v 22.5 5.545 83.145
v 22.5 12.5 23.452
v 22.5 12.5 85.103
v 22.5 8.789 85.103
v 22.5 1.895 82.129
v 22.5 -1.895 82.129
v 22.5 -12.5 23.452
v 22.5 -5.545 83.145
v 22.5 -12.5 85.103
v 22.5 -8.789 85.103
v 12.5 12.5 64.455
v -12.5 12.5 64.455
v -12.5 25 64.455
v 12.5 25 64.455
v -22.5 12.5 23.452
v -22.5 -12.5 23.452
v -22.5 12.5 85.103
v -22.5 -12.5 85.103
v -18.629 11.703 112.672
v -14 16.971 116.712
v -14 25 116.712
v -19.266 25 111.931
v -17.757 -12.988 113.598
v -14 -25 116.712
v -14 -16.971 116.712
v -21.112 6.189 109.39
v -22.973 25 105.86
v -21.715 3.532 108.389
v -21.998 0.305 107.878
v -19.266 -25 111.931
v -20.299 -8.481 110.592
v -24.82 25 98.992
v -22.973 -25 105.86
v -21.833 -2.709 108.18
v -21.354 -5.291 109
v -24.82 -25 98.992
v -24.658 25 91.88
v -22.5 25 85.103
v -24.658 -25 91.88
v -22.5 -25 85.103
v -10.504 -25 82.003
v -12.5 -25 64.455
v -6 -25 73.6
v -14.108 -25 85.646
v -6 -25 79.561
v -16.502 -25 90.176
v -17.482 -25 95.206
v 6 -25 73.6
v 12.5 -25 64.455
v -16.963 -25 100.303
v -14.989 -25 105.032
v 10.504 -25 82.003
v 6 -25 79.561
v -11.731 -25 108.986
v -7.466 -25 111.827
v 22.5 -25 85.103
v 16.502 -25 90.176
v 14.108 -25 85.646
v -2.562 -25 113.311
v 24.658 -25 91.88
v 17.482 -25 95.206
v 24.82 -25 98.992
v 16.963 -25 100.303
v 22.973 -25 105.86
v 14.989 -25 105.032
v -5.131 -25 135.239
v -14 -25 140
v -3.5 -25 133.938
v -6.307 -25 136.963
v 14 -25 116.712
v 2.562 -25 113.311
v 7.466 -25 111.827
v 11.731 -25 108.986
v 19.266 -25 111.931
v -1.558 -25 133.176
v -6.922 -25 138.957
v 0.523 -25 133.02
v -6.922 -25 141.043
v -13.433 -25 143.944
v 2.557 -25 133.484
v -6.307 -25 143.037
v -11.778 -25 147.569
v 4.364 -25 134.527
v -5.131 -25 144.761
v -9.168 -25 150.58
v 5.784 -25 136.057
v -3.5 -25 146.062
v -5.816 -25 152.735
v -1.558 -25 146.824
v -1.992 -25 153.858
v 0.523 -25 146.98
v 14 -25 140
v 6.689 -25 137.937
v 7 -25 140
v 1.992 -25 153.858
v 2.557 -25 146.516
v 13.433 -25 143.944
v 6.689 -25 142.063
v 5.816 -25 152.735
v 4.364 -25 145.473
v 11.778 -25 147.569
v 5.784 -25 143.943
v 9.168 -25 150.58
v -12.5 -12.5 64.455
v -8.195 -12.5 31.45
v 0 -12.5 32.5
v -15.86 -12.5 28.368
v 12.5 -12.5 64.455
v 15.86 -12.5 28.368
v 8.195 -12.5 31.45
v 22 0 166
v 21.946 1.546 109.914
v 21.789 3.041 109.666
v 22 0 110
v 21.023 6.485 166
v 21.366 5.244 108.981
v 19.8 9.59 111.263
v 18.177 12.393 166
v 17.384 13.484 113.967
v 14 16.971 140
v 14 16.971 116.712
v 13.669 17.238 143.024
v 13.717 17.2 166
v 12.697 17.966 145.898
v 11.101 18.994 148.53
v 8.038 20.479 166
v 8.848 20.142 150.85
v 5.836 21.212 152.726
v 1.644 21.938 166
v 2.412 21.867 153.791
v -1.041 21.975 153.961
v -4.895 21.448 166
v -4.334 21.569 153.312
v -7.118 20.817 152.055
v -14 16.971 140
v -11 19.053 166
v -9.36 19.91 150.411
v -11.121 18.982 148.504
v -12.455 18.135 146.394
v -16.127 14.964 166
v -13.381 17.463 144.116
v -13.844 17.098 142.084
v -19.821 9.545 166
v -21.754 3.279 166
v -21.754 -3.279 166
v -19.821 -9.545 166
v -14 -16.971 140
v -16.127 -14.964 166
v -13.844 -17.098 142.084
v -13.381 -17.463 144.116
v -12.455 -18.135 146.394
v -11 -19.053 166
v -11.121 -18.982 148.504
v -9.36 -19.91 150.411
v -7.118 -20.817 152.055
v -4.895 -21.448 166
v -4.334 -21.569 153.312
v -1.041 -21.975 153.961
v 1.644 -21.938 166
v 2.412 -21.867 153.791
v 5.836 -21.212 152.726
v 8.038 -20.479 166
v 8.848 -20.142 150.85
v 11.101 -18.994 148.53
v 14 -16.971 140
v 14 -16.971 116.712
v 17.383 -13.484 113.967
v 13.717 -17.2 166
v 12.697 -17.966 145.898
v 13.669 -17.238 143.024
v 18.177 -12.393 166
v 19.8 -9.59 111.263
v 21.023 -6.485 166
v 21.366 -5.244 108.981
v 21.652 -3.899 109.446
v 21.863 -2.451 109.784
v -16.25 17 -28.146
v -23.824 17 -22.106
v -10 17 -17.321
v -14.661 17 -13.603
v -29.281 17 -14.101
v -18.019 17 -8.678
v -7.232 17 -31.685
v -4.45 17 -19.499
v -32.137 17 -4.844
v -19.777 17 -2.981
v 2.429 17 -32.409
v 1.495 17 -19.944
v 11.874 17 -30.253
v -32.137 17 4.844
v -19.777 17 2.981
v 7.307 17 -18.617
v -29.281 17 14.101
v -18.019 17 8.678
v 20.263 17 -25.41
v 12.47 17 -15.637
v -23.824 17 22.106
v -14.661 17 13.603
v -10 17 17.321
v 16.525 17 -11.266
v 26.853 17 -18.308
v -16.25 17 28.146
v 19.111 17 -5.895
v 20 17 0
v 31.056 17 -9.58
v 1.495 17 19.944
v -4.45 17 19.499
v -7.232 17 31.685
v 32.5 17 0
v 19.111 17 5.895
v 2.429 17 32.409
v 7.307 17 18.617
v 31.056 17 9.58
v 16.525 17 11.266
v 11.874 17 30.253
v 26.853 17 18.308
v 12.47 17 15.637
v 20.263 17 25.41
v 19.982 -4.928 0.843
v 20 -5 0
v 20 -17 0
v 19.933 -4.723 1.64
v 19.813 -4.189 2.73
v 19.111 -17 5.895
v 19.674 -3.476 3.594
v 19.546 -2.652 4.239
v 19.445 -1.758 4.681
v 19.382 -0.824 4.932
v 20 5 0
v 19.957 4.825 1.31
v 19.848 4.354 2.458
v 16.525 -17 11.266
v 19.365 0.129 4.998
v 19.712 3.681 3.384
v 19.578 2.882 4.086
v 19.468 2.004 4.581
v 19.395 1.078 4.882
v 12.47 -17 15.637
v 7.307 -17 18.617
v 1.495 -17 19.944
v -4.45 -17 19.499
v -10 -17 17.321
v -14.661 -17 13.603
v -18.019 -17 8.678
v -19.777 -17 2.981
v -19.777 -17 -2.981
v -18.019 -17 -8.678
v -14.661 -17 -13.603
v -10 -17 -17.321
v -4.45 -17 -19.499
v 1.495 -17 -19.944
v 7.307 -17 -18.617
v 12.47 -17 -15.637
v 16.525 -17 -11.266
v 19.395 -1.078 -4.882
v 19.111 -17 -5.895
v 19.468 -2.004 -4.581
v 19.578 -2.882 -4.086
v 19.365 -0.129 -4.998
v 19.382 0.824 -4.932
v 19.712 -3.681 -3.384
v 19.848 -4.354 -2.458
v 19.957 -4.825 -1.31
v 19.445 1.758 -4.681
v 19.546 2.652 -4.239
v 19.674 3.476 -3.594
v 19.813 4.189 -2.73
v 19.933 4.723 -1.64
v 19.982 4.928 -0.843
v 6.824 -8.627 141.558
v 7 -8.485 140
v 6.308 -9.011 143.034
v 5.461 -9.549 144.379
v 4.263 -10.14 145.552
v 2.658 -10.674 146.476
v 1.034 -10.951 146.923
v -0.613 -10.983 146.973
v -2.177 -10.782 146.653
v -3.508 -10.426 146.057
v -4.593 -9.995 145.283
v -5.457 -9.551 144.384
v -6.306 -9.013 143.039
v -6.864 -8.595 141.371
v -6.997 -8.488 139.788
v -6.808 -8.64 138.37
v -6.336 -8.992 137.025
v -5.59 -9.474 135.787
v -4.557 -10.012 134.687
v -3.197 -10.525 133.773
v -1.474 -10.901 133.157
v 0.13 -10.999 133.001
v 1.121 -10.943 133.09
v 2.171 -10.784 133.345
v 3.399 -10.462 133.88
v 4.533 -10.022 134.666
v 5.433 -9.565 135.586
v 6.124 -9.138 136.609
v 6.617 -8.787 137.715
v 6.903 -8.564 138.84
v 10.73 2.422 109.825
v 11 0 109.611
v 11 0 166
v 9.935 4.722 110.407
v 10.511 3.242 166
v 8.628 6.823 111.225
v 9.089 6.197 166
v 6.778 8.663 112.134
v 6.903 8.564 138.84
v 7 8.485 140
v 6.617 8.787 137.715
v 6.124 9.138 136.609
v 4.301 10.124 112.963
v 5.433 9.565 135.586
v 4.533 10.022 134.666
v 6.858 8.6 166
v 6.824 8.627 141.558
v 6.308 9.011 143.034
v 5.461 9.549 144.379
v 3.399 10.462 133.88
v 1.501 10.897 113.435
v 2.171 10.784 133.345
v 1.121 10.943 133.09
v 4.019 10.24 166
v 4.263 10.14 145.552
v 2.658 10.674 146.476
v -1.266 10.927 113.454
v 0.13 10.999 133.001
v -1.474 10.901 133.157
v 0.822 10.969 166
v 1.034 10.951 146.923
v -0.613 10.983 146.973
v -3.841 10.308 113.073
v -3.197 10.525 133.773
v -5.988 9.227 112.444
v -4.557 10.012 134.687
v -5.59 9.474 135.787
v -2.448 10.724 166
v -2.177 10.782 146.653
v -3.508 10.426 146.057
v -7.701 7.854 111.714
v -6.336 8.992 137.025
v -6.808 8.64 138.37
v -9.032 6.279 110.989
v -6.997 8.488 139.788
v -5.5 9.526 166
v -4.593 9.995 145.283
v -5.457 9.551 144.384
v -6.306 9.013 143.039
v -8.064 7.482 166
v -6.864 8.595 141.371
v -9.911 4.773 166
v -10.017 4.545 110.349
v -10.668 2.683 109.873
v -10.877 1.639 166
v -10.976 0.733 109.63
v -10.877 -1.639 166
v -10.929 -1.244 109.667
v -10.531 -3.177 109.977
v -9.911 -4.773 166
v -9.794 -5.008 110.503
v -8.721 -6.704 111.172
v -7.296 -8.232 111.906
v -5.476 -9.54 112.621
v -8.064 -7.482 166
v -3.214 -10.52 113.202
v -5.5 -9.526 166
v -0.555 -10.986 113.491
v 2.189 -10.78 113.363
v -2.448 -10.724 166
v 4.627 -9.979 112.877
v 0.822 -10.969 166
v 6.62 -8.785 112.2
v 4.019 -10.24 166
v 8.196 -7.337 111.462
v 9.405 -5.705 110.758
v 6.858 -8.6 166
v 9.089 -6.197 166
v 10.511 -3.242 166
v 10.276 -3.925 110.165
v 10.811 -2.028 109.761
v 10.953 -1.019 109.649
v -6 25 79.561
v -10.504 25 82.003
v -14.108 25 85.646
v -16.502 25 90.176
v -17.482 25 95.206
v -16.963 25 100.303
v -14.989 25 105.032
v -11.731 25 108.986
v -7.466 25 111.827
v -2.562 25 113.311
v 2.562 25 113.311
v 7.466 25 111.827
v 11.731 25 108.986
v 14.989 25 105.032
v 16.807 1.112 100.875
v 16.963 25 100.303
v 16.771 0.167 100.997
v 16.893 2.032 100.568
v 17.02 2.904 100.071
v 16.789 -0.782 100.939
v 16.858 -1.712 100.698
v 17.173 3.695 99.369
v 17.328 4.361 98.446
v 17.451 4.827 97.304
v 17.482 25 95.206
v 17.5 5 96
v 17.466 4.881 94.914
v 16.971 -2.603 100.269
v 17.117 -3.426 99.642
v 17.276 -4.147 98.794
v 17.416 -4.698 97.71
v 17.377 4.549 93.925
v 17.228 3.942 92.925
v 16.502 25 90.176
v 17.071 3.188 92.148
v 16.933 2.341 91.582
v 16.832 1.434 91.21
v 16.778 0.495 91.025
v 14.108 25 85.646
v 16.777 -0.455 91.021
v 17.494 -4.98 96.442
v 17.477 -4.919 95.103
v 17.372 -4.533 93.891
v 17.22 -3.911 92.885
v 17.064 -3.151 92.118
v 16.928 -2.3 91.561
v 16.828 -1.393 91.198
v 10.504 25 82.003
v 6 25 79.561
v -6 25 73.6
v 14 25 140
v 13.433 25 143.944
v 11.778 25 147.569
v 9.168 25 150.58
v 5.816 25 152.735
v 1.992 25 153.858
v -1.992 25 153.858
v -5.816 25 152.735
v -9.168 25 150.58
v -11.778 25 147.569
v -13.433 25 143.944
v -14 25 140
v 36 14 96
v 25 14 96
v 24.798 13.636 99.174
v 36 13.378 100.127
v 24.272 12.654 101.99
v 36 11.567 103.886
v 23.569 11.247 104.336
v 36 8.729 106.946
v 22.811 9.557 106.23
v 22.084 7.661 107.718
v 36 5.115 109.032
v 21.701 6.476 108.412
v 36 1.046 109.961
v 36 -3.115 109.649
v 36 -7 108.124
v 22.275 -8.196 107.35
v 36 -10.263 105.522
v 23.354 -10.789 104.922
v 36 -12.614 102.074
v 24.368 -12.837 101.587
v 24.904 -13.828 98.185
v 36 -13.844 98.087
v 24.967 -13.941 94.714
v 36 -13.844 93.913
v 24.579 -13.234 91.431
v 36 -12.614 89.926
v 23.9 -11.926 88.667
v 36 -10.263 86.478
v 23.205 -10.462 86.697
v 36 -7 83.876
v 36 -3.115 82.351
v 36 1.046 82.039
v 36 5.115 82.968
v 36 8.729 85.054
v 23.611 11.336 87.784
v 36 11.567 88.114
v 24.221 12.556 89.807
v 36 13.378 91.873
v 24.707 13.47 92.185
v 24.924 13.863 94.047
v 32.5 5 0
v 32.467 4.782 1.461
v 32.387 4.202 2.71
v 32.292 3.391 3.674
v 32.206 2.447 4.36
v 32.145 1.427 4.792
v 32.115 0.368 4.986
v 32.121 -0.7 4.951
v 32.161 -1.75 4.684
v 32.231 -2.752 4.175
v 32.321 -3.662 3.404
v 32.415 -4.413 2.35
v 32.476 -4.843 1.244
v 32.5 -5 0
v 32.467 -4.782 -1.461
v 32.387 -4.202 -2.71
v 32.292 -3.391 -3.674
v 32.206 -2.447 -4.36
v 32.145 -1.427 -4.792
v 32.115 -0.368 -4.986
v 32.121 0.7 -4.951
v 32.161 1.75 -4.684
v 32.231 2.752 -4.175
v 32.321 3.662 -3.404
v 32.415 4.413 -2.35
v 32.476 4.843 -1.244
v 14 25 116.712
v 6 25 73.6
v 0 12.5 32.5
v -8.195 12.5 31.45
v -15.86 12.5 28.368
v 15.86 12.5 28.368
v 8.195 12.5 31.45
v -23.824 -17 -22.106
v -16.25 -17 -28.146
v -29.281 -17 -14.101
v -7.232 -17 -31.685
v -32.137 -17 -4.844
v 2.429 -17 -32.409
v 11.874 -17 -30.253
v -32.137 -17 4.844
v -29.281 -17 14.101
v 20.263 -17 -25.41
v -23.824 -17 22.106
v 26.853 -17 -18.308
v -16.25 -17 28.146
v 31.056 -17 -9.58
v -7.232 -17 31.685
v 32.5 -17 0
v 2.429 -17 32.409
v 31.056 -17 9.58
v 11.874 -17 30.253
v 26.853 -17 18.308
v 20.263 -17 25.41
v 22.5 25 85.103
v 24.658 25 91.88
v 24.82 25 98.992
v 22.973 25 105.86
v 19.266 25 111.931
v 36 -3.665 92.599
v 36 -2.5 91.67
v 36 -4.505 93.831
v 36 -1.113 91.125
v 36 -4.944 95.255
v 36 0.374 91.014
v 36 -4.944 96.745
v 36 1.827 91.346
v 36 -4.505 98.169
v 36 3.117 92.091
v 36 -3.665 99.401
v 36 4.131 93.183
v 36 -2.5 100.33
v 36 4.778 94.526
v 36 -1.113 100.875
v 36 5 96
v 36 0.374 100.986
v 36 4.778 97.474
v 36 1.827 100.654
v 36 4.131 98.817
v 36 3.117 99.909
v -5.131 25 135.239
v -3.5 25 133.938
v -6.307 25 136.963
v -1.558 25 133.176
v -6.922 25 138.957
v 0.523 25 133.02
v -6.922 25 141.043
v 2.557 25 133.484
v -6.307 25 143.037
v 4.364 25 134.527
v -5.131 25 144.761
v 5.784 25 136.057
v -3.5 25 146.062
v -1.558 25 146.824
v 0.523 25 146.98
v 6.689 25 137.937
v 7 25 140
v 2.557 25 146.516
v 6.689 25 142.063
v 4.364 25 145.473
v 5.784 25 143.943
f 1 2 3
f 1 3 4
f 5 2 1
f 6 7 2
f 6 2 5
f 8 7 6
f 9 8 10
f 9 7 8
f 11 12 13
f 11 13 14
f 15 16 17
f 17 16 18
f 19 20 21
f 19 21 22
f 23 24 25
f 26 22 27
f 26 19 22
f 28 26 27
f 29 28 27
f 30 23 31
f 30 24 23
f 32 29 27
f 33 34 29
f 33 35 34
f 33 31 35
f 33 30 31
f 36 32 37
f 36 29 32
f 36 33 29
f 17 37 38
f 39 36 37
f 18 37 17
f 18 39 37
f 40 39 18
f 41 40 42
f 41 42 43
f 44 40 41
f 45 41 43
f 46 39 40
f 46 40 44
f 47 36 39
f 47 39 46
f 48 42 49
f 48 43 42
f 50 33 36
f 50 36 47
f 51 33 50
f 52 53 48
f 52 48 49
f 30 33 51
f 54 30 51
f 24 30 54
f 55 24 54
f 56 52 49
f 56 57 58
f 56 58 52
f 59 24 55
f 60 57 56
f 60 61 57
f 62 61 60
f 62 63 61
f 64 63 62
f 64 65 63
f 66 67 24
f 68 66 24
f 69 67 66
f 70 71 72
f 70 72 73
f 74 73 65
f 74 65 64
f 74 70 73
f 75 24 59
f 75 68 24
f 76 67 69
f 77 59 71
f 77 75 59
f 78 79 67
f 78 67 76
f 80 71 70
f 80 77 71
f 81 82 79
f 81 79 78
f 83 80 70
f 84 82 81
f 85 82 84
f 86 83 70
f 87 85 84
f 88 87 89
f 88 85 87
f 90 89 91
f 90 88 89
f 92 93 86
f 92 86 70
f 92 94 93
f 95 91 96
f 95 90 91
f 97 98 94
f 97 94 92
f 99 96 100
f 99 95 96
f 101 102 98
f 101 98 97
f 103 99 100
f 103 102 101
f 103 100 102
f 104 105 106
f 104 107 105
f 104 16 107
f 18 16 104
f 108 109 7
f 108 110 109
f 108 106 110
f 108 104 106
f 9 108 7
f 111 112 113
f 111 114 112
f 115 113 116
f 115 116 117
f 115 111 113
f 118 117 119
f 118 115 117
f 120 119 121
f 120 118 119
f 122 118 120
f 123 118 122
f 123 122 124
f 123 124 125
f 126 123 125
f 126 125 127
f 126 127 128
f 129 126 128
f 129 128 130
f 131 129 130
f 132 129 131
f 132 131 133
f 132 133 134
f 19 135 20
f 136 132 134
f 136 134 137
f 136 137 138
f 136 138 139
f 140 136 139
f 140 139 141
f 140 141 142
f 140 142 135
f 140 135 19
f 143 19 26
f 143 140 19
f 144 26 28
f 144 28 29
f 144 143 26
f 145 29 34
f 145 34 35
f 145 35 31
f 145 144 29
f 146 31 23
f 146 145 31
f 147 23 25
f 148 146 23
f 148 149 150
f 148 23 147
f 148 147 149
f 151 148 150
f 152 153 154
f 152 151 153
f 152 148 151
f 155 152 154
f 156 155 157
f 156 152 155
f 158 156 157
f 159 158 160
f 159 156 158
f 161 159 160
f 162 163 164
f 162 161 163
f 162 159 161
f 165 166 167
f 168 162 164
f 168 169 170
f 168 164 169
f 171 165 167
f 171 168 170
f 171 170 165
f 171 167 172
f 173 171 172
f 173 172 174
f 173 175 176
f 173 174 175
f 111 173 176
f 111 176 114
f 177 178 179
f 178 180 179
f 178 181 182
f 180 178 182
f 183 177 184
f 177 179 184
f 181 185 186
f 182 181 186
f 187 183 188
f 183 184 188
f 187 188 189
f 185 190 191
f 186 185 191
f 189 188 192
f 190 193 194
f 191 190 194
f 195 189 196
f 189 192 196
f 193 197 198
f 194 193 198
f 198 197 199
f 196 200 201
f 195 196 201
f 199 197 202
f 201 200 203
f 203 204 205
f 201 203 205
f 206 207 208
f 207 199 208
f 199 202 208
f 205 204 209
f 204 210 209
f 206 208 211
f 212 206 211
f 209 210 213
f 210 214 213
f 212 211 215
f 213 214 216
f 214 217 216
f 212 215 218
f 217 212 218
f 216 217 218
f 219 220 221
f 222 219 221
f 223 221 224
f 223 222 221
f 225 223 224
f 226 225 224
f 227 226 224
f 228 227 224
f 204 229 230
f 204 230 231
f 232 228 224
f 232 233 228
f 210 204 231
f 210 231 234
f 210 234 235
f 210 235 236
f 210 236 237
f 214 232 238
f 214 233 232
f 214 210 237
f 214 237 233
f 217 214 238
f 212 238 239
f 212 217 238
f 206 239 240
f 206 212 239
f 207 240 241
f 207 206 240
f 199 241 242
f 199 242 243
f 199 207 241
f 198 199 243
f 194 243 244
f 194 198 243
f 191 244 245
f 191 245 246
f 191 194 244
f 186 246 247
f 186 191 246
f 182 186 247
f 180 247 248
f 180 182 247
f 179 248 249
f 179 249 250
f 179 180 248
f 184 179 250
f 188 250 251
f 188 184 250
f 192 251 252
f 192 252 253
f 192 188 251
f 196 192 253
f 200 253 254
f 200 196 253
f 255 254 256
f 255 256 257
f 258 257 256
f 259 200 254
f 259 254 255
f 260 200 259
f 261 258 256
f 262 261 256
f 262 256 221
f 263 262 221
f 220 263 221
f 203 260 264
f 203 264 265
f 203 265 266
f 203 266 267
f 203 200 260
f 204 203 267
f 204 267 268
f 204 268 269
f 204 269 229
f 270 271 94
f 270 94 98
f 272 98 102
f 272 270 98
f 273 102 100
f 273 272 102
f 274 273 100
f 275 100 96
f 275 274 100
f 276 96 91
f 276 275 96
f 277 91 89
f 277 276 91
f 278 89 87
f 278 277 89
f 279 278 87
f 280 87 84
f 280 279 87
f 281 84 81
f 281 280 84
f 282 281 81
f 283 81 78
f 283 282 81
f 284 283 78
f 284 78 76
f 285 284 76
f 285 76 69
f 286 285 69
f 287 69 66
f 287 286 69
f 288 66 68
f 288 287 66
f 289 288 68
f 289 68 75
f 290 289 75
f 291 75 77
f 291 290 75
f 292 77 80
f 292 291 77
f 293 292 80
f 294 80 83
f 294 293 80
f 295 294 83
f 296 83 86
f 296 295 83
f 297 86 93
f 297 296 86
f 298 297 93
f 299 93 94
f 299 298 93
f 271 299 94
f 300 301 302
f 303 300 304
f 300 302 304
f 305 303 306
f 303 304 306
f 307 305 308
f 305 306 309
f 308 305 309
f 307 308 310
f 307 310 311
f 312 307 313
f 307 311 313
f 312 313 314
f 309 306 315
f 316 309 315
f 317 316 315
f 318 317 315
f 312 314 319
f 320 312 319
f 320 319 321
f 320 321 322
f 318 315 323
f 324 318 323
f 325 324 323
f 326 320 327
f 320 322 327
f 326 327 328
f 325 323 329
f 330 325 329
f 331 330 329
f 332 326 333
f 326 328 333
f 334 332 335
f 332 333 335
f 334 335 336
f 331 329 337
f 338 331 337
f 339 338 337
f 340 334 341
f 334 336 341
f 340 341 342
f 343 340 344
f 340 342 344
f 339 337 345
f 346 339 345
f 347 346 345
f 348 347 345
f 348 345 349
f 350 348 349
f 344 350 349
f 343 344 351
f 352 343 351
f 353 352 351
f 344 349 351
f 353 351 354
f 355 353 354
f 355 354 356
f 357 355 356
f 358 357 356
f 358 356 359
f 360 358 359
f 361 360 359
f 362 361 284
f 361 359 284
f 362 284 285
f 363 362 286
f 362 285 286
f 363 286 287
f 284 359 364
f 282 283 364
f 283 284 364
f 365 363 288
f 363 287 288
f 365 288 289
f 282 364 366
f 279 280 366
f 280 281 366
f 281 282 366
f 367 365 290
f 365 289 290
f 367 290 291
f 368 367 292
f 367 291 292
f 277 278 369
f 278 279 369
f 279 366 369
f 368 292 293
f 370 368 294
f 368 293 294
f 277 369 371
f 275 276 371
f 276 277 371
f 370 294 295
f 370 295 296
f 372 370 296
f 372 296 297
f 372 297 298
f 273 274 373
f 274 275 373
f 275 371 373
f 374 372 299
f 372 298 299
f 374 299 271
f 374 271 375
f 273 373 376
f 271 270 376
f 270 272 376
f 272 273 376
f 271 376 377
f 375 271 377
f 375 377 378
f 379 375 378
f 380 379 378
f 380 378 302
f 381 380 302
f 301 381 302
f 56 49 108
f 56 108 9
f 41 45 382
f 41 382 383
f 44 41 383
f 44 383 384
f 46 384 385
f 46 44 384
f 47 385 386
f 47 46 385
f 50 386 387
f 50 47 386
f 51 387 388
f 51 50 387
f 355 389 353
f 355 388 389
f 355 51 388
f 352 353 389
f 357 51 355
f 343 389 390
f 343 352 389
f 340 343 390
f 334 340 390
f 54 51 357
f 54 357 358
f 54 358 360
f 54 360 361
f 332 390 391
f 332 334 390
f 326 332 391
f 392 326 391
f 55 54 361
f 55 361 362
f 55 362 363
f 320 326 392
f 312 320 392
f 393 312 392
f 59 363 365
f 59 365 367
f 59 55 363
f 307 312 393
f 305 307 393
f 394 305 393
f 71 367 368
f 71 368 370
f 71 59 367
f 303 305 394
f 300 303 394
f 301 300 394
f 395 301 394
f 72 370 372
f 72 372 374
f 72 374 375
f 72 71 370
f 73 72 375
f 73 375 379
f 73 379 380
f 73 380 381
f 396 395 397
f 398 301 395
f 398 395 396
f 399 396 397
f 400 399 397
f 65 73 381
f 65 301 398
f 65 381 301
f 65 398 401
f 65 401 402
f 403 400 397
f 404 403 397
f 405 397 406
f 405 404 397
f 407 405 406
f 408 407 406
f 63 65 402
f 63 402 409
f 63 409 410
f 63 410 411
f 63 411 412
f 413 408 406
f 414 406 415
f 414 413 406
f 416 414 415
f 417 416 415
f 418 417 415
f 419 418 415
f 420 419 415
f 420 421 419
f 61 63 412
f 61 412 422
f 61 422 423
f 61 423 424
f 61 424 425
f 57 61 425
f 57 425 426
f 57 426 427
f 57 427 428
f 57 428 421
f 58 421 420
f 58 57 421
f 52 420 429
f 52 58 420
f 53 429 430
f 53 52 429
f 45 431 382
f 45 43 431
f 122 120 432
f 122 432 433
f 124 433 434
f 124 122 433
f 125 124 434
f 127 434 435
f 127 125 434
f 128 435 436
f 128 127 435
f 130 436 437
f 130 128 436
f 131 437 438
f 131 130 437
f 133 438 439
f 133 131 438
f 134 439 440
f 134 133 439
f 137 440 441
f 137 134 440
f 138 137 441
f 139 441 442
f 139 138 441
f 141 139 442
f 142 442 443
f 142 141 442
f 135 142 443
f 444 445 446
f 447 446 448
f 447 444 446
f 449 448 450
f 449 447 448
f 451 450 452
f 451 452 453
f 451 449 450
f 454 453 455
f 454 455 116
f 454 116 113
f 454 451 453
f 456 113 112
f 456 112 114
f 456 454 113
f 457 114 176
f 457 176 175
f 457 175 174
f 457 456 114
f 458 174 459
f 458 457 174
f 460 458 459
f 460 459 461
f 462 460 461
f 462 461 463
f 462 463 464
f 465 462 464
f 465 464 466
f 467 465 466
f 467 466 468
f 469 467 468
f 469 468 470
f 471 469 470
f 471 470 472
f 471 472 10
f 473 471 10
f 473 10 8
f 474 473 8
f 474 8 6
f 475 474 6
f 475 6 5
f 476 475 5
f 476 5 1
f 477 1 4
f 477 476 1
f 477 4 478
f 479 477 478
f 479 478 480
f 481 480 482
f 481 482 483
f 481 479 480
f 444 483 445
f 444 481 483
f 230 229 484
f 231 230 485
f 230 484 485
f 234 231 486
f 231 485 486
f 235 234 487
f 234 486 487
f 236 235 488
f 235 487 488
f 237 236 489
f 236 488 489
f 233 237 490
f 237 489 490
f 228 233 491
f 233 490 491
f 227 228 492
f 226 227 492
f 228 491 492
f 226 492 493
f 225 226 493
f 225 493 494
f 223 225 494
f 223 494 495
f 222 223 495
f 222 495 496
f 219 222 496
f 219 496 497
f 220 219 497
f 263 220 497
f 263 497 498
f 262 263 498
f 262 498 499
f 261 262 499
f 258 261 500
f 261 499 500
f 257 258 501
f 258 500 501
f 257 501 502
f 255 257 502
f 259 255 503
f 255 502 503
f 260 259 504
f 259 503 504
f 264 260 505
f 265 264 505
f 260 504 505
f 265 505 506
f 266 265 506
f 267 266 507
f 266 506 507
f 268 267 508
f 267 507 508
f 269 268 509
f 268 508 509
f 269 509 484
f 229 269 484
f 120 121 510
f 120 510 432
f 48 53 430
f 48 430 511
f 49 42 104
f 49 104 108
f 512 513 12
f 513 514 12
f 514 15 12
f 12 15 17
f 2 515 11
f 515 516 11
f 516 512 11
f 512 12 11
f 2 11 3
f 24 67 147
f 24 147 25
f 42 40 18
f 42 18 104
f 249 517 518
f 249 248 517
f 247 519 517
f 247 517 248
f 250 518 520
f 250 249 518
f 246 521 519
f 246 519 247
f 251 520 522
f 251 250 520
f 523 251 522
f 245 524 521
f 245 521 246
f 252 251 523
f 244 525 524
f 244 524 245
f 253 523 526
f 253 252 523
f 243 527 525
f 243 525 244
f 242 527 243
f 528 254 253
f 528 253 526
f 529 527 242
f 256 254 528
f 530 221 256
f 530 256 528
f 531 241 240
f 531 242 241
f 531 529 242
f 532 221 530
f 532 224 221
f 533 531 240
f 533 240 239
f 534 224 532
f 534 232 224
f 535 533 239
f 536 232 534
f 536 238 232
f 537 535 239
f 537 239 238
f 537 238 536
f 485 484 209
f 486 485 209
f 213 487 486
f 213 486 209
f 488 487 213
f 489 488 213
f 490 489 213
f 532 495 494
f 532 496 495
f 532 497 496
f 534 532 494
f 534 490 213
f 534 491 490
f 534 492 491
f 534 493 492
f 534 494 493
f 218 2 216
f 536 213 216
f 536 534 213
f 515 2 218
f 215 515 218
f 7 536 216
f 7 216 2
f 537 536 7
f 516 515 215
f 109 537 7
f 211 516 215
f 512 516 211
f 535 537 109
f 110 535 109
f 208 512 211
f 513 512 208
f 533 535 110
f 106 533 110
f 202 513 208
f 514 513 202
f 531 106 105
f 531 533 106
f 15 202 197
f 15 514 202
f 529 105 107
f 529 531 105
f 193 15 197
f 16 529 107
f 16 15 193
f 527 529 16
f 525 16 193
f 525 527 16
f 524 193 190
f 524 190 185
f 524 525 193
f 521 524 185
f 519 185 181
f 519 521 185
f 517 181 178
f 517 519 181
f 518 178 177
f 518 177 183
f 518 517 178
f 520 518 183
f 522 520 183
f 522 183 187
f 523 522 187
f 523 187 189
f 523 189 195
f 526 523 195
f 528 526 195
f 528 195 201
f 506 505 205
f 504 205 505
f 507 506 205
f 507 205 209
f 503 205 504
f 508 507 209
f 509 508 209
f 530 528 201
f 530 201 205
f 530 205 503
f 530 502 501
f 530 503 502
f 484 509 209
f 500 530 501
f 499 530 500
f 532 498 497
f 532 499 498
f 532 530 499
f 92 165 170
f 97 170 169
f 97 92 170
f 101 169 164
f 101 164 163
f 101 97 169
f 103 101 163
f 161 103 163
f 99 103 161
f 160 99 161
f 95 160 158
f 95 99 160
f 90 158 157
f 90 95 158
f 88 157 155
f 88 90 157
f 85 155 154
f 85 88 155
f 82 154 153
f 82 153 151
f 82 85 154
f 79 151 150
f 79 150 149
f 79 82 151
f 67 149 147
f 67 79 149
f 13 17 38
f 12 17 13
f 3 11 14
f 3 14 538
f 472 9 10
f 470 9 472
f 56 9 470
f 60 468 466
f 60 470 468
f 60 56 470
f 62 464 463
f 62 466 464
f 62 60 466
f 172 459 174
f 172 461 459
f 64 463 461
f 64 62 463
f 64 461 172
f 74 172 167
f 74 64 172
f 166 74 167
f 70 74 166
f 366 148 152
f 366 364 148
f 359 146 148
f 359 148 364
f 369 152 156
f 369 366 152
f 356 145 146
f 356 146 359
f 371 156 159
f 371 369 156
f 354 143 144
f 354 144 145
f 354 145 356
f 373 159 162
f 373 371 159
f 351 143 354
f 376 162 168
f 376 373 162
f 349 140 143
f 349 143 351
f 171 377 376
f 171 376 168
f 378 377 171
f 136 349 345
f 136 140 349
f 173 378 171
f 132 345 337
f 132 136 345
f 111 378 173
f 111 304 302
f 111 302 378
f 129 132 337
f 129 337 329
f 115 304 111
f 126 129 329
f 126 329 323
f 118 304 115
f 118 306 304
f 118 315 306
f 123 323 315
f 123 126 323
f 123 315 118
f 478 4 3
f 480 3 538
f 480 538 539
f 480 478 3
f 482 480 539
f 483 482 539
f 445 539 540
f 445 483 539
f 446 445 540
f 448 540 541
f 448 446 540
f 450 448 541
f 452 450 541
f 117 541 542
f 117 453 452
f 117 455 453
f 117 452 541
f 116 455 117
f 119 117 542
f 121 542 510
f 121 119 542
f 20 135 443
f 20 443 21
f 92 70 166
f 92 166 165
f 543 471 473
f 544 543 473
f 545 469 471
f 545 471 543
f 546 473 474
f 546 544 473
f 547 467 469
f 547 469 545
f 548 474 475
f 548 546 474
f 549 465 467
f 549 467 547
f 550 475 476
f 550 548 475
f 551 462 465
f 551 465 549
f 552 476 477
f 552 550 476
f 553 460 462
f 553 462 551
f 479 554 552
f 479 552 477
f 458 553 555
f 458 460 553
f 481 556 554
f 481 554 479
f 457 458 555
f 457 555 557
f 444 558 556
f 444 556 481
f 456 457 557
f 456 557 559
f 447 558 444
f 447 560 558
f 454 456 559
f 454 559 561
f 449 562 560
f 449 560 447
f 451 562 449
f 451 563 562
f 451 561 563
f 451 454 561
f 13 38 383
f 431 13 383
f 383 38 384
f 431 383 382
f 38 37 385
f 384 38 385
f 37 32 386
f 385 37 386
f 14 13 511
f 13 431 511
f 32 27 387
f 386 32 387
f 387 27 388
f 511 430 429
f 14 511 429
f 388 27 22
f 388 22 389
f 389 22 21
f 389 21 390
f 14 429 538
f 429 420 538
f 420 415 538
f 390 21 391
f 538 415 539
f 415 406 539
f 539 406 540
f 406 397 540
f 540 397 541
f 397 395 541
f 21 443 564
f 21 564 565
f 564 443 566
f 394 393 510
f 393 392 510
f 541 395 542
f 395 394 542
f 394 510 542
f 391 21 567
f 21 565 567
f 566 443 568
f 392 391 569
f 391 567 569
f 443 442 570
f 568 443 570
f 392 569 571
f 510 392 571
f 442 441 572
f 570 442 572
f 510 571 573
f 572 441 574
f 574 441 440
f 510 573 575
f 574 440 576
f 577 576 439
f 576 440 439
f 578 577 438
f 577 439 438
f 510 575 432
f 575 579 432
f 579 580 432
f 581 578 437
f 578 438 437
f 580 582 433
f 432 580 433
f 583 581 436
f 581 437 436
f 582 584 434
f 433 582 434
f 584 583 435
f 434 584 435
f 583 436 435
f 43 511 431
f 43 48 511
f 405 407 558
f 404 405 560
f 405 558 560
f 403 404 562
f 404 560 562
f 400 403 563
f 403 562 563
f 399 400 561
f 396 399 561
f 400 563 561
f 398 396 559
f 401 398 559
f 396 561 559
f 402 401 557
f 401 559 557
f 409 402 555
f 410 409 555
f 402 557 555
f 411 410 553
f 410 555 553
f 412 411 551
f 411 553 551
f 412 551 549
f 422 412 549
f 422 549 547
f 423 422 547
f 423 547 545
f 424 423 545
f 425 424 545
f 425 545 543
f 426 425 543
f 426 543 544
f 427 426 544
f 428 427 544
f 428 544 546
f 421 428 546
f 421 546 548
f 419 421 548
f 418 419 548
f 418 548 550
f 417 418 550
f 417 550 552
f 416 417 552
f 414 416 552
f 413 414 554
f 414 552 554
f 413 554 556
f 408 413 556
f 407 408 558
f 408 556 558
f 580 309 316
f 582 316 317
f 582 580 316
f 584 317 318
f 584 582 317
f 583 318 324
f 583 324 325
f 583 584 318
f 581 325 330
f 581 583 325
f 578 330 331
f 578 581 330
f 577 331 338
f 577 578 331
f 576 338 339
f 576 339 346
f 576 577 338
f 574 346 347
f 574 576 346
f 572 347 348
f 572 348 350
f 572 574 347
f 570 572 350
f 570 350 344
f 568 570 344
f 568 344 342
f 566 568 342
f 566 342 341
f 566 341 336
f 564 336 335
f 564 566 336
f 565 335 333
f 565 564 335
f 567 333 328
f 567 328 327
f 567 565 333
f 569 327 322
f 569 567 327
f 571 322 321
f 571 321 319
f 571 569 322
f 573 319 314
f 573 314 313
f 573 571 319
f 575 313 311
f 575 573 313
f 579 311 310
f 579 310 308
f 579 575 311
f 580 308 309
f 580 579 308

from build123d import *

# Parameters (mm, degrees)
F0_R      = 32.5
F0_R_2    = 20
F1_DEPTH  = 17
F2_W      = 45
F2_H      = 96
F3_DEPTH  = 12.5
F4_DEPTH  = 29.501
F5_R      = 7
F6_DEPTH  = 25
F7_DEPTH  = 37.501
F9_R      = 22
F11_R     = 11
F12_DEPTH = 70
F14_R     = 14
F16_R     = 5
F17_DEPTH = 19.2304902688
F18_R     = 5
F19_DEPTH = 25


with BuildPart() as f1:
    # F0 (on Front) → F1 (new body, symmetric)
    with BuildSketch(Plane.XZ):
        Circle(F0_R)
        Circle(F0_R_2, mode=Mode.SUBTRACT)
    extrude(amount=F1_DEPTH, both=True)

    # F2 (on Front) → F3 (join, symmetric)
    with BuildSketch(Plane.XZ):
        with Locations((0, 48)):
            Rectangle(F2_W, F2_H)
    extrude(amount=F3_DEPTH, both=True)

    # F4 (cut, through all): a face of the model
    f4_faces = [f1.faces().sort_by_distance(p)[0] for p in [
        (0, -12.5, 8.4882636316),
    ]]
    extrude(f4_faces, amount=-F4_DEPTH, mode=Mode.SUBTRACT)

    # F5 (on Front) → F6 (join, symmetric)
    with BuildSketch(Plane.XZ):
        with BuildLine():
            ThreePointArc((14, 140), (0, 154), (-14, 140))
            Line((-14, 140), (-14, 116.7123151772))
            ThreePointArc((-14, 116.7123151772), (-24.1423613371, 102.4920250361), (-22.5, 85.1027526411))
            Line((-22.5, 85.1027526411), (-12.5, 64.4553365928))
            Line((-12.5, 64.4553365928), (12.5, 64.4553365928))
            Line((12.5, 64.4553365928), (22.5, 85.1027526411))
            ThreePointArc((22.5, 85.1027526411), (24.1423613371, 102.4920250361), (14, 116.7123151772))
            Line((14, 116.7123151772), (14, 140))
        make_face()
        with BuildLine():
            ThreePointArc((-6, 79.5607177772), (0, 113.5), (6, 79.5607177772))
            Line((6, 79.5607177772), (6, 73.6))
            Line((6, 73.6), (-6, 73.6))
            Line((-6, 73.6), (-6, 79.5607177772))
        make_face(mode=Mode.SUBTRACT)
        with Locations((0, 140)):
            Circle(F5_R, mode=Mode.SUBTRACT)
    extrude(amount=F6_DEPTH, both=True)

    # F7 (cut, through all): a face of the model
    f7_faces = [f1.faces().sort_by_distance(p)[0] for p in [
        (0, -12.5, 87.144181228),
    ]]
    extrude(f7_faces, amount=-F7_DEPTH, mode=Mode.SUBTRACT)

    # F9 (on offset) → F10 (join, up to the next surface of F1)
    with BuildSketch(Plane.XY.offset(166)):
        Circle(F9_R)
    extrude(until=Until.NEXT, dir=(0, 0, -1))

    # F11 (on face) → F12 (cut)
    with BuildSketch(Plane.XY.offset(166)):
        Circle(F11_R)
    extrude(amount=-F12_DEPTH, mode=Mode.SUBTRACT)

    # F14 (on offset) → F15 (join, up to the next surface of F1)
    with BuildSketch(Plane.YZ.offset(36)):
        with Locations((0, 96)):
            Circle(F14_R)
    extrude(until=Until.NEXT, dir=(-1, 0, 0))

    # F16 (on offset) → F17 (cut, through all)
    with BuildSketch(Plane.YZ.offset(36)):
        with Locations((0, 96)):
            Circle(F16_R)
    extrude(amount=-F17_DEPTH, mode=Mode.SUBTRACT)

    # F18 (on offset) → F19 (cut)
    with BuildSketch(Plane.YZ.offset(36)):
        Circle(F18_R)
    extrude(amount=-F19_DEPTH, mode=Mode.SUBTRACT)


solid = f1.part
